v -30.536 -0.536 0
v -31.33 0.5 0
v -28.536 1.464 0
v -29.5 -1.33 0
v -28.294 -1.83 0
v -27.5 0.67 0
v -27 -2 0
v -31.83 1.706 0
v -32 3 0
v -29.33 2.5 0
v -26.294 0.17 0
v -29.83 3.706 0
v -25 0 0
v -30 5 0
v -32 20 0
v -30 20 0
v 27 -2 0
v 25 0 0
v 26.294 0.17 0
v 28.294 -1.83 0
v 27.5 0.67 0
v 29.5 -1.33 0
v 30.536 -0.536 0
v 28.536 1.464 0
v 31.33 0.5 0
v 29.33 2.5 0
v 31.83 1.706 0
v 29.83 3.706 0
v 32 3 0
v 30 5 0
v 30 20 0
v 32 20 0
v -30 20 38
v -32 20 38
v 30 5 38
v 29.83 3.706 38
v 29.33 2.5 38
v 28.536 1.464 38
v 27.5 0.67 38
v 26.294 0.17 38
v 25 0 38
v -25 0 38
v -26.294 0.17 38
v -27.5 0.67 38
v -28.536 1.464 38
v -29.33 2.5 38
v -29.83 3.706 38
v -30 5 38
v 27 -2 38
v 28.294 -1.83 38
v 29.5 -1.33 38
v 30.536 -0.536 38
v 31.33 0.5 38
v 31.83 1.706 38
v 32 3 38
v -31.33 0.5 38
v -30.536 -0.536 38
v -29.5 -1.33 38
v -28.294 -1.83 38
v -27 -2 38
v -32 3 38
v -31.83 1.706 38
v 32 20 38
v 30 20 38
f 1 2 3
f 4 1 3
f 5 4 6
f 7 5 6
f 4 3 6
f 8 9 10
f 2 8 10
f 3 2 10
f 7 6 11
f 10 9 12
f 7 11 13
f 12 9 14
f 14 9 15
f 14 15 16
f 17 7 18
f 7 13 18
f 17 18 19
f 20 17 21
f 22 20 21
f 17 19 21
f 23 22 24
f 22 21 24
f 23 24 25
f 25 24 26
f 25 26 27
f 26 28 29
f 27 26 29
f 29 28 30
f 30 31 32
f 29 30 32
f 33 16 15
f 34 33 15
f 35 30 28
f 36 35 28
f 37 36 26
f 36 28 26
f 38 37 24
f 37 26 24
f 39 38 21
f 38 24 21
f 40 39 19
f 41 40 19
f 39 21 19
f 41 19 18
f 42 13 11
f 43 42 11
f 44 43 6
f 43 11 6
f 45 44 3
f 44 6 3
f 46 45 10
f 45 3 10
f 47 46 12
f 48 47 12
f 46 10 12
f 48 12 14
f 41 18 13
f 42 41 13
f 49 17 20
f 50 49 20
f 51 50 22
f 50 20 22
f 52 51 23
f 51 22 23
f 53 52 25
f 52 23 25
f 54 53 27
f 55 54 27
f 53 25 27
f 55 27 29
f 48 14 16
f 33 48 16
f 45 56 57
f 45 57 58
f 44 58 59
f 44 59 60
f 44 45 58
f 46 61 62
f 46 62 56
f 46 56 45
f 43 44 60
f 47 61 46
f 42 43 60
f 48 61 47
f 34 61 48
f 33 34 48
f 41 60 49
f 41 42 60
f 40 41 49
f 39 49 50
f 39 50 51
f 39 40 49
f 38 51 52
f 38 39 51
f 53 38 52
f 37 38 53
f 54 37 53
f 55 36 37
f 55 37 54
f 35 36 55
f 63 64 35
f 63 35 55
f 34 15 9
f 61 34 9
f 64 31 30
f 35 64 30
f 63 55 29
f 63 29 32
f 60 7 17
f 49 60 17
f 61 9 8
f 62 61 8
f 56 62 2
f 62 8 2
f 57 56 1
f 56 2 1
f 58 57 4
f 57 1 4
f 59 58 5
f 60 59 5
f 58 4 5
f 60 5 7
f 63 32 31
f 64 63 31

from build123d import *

# Parameters (mm, degrees)
F1_DEPTH = 38


with BuildPart() as f1:
    # F0 (on Top) → F1 (new body)
    with BuildSketch(Plane.XY):
        with BuildLine():
            Line((25, 0), (0, 0))
            Line((0, 0), (-25, 0))
            ThreePointArc((-25, 0), (-28.535534, 1.464466), (-30, 5))
            Line((-30, 5), (-30, 20))
            Line((-30, 20), (-32, 20))
            Line((-32, 20), (-32, 3))
            ThreePointArc((-32, 3), (-30.535534, -0.535534), (-27, -2))
            Line((-27, -2), (0, -2))
            Line((0, -2), (27, -2))
            ThreePointArc((27, -2), (30.535534, -0.535534), (32, 3))
            Line((32, 3), (32, 20))
            Line((32, 20), (30, 20))
            Line((30, 20), (30, 5))
            ThreePointArc((30, 5), (28.535534, 1.464466), (25, 0))
        make_face()
    extrude(amount=F1_DEPTH)


solid = f1.part
